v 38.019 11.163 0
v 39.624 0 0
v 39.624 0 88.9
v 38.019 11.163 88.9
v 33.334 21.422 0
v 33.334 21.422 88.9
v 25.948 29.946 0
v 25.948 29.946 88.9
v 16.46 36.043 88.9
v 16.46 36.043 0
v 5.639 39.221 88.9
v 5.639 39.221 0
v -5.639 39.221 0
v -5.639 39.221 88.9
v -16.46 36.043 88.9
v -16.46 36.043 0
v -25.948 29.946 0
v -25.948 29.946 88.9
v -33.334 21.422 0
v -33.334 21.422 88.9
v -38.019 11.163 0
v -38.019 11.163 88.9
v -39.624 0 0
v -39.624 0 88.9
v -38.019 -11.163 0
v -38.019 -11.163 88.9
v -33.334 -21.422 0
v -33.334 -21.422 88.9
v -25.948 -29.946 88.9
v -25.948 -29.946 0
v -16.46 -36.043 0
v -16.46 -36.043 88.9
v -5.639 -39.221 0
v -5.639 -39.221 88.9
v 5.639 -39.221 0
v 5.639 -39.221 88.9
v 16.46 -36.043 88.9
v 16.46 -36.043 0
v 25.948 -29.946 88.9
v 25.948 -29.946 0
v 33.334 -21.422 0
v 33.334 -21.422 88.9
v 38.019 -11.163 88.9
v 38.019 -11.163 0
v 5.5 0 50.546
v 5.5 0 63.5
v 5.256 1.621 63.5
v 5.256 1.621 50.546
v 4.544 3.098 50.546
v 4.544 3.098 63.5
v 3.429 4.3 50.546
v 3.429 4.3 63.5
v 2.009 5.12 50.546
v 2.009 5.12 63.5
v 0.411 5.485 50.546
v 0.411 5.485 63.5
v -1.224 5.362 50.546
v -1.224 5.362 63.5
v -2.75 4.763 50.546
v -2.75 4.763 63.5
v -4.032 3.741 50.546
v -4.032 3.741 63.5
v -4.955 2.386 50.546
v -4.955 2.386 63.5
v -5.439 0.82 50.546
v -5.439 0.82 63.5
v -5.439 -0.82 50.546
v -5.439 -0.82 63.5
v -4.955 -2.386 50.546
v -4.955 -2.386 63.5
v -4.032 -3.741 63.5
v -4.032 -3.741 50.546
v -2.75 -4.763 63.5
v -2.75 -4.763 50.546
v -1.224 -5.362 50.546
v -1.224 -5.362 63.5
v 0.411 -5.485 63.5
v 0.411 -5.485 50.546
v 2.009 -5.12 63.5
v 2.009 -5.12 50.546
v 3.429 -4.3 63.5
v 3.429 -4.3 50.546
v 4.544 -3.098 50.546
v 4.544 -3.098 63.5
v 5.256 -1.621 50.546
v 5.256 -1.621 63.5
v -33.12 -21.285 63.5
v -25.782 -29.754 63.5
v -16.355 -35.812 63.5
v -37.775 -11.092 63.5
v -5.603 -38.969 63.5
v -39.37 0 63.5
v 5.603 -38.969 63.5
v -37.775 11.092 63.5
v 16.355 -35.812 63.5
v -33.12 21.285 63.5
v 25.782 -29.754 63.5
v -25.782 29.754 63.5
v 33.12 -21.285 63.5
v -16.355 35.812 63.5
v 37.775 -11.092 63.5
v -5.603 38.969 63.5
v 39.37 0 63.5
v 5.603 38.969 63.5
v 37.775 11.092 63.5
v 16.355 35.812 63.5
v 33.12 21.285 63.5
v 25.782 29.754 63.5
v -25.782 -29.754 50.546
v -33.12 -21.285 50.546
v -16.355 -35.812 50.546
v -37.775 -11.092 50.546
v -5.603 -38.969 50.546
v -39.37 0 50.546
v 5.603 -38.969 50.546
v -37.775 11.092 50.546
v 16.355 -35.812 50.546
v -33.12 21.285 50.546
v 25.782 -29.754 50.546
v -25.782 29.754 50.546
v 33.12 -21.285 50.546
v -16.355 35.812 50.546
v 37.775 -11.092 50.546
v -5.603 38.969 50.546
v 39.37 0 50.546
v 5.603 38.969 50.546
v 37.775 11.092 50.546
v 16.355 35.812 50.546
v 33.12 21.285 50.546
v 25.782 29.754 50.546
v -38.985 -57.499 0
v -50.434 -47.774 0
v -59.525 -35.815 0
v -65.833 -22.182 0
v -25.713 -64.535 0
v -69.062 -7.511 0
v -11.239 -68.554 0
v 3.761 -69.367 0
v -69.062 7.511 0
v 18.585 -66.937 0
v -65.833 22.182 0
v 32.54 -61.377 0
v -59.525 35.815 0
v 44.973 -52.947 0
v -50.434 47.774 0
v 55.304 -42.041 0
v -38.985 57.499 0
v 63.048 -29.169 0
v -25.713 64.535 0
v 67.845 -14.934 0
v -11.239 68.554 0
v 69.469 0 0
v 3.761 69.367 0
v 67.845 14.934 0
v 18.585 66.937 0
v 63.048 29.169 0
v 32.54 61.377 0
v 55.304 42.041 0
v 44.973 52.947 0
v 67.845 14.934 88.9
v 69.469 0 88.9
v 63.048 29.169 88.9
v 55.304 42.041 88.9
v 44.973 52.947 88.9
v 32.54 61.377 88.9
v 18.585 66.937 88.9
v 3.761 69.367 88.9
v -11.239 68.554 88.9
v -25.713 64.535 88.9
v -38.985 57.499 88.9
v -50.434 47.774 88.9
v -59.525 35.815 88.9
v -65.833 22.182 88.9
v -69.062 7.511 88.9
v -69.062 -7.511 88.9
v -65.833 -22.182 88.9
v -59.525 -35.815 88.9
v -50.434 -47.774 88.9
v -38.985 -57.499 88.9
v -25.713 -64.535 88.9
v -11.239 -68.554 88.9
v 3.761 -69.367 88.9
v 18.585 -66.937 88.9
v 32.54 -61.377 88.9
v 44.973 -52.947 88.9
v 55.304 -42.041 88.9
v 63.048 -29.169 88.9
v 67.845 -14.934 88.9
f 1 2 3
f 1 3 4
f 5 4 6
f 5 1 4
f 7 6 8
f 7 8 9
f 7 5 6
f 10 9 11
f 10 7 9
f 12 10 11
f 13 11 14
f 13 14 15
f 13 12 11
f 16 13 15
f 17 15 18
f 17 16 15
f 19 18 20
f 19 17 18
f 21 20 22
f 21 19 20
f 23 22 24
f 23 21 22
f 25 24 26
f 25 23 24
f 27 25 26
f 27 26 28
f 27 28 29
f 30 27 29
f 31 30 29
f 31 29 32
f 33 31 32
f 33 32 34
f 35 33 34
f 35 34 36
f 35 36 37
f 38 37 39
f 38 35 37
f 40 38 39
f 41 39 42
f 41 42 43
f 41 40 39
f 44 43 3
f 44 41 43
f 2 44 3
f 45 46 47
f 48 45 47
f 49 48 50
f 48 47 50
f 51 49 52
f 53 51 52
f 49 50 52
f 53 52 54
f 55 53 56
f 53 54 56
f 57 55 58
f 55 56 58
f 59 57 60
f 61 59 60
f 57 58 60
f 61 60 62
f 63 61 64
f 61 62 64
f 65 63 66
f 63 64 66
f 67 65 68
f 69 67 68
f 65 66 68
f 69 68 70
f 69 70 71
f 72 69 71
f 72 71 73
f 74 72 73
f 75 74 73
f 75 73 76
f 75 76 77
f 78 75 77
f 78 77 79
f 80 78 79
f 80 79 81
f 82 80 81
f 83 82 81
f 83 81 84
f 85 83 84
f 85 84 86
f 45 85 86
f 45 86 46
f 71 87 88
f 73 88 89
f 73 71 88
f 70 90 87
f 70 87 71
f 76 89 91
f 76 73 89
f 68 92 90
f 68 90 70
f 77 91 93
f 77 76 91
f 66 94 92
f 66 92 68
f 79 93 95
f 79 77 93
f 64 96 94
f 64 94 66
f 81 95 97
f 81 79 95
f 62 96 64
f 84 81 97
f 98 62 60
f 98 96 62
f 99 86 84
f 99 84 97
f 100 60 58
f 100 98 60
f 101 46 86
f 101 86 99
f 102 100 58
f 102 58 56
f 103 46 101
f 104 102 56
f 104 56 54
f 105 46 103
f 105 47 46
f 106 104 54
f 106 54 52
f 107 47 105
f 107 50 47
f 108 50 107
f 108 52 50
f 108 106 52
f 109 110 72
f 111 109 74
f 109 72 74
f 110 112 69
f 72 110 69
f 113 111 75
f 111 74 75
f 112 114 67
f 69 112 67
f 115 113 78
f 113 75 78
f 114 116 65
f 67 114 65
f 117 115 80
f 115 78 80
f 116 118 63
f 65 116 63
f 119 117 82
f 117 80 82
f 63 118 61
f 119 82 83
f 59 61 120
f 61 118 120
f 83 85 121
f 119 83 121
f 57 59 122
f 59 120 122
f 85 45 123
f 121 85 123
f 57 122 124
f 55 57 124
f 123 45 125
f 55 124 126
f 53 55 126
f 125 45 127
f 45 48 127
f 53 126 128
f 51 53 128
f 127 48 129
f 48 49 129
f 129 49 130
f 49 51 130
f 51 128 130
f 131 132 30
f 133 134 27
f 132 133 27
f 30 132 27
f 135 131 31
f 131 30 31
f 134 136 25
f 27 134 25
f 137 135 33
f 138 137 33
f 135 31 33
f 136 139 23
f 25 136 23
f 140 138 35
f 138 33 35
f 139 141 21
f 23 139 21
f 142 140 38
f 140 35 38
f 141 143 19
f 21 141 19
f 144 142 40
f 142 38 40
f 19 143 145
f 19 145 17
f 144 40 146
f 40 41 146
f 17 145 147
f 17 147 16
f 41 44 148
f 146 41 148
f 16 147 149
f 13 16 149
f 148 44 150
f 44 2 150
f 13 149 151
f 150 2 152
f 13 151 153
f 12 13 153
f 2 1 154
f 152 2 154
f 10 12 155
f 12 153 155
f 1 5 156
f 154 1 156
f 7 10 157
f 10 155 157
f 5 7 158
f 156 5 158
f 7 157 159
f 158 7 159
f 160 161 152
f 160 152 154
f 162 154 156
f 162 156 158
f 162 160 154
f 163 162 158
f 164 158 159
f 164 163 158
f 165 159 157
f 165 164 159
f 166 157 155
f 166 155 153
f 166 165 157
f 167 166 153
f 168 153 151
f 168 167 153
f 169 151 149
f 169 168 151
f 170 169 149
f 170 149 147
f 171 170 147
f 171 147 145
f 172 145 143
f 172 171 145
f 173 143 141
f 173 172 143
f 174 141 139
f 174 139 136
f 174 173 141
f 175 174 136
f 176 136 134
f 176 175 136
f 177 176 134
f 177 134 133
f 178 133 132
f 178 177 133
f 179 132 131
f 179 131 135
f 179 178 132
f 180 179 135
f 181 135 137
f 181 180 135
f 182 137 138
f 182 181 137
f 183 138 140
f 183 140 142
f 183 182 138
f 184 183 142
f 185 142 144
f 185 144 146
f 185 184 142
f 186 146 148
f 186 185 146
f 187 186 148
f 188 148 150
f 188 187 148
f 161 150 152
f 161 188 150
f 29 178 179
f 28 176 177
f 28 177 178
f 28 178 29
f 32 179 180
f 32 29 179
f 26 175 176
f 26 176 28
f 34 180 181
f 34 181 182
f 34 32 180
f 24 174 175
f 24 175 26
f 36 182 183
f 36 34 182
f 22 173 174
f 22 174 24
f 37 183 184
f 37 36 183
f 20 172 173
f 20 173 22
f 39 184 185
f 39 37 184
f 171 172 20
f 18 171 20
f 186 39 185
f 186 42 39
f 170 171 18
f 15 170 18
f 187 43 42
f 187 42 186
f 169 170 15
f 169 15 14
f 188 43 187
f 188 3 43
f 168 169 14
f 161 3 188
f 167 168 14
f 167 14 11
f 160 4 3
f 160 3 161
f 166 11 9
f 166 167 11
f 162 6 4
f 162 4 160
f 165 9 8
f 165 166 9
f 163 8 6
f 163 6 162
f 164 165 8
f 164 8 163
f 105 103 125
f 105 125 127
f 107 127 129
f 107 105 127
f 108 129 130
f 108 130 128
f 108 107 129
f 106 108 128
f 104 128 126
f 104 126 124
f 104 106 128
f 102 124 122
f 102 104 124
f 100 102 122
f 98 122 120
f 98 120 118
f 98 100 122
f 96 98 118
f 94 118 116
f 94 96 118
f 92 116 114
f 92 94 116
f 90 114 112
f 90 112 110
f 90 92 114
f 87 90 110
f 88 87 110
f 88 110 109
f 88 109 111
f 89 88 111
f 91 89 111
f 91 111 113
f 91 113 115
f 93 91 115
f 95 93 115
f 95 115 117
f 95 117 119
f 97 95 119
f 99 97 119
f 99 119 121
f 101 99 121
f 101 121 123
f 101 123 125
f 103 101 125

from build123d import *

# Parameters (mm, degrees)
F0_R        = 50.8
F0_R_2      = 39.624
F1_DEPTH    = 88.9
F2_R        = 39.37
F2_R_2      = 5.500002
F3_DEPTH    = 38.354
F3_FACE_R   = 39.37
F3_FACE_R_2 = 5.500002
F4_DEPTH    = 25.4
F5_R        = 69.469
F5_R_2      = 50.8
F6_DEPTH    = 88.9


with BuildPart() as f1:
    # F0 (on Top) → F1 (new body)
    with BuildSketch(Plane.XY):
        Circle(F0_R)
        Circle(F0_R_2, mode=Mode.SUBTRACT)
    extrude(amount=F1_DEPTH)

    # F5 (on face) → F6 (join)
    with BuildSketch(Plane.XY.offset(88.9)):
        Circle(F5_R)
        Circle(F5_R_2, mode=Mode.SUBTRACT)
    extrude(amount=-F6_DEPTH)


with BuildPart() as f3:
    # F2 (on face) → F3 (new body)
    with BuildSketch(Plane.XY.offset(88.9)):
        Circle(F2_R)
        Circle(F2_R_2, mode=Mode.SUBTRACT)
    extrude(amount=-F3_DEPTH)

    # F3_face (on face) → F4 (cut)
    with BuildSketch(Plane.XY.offset(88.9)):
        Circle(F3_FACE_R)
        Circle(F3_FACE_R_2, mode=Mode.SUBTRACT)
    extrude(amount=-F4_DEPTH, mode=Mode.SUBTRACT)


solid = Compound([f1.part, f3.part])
